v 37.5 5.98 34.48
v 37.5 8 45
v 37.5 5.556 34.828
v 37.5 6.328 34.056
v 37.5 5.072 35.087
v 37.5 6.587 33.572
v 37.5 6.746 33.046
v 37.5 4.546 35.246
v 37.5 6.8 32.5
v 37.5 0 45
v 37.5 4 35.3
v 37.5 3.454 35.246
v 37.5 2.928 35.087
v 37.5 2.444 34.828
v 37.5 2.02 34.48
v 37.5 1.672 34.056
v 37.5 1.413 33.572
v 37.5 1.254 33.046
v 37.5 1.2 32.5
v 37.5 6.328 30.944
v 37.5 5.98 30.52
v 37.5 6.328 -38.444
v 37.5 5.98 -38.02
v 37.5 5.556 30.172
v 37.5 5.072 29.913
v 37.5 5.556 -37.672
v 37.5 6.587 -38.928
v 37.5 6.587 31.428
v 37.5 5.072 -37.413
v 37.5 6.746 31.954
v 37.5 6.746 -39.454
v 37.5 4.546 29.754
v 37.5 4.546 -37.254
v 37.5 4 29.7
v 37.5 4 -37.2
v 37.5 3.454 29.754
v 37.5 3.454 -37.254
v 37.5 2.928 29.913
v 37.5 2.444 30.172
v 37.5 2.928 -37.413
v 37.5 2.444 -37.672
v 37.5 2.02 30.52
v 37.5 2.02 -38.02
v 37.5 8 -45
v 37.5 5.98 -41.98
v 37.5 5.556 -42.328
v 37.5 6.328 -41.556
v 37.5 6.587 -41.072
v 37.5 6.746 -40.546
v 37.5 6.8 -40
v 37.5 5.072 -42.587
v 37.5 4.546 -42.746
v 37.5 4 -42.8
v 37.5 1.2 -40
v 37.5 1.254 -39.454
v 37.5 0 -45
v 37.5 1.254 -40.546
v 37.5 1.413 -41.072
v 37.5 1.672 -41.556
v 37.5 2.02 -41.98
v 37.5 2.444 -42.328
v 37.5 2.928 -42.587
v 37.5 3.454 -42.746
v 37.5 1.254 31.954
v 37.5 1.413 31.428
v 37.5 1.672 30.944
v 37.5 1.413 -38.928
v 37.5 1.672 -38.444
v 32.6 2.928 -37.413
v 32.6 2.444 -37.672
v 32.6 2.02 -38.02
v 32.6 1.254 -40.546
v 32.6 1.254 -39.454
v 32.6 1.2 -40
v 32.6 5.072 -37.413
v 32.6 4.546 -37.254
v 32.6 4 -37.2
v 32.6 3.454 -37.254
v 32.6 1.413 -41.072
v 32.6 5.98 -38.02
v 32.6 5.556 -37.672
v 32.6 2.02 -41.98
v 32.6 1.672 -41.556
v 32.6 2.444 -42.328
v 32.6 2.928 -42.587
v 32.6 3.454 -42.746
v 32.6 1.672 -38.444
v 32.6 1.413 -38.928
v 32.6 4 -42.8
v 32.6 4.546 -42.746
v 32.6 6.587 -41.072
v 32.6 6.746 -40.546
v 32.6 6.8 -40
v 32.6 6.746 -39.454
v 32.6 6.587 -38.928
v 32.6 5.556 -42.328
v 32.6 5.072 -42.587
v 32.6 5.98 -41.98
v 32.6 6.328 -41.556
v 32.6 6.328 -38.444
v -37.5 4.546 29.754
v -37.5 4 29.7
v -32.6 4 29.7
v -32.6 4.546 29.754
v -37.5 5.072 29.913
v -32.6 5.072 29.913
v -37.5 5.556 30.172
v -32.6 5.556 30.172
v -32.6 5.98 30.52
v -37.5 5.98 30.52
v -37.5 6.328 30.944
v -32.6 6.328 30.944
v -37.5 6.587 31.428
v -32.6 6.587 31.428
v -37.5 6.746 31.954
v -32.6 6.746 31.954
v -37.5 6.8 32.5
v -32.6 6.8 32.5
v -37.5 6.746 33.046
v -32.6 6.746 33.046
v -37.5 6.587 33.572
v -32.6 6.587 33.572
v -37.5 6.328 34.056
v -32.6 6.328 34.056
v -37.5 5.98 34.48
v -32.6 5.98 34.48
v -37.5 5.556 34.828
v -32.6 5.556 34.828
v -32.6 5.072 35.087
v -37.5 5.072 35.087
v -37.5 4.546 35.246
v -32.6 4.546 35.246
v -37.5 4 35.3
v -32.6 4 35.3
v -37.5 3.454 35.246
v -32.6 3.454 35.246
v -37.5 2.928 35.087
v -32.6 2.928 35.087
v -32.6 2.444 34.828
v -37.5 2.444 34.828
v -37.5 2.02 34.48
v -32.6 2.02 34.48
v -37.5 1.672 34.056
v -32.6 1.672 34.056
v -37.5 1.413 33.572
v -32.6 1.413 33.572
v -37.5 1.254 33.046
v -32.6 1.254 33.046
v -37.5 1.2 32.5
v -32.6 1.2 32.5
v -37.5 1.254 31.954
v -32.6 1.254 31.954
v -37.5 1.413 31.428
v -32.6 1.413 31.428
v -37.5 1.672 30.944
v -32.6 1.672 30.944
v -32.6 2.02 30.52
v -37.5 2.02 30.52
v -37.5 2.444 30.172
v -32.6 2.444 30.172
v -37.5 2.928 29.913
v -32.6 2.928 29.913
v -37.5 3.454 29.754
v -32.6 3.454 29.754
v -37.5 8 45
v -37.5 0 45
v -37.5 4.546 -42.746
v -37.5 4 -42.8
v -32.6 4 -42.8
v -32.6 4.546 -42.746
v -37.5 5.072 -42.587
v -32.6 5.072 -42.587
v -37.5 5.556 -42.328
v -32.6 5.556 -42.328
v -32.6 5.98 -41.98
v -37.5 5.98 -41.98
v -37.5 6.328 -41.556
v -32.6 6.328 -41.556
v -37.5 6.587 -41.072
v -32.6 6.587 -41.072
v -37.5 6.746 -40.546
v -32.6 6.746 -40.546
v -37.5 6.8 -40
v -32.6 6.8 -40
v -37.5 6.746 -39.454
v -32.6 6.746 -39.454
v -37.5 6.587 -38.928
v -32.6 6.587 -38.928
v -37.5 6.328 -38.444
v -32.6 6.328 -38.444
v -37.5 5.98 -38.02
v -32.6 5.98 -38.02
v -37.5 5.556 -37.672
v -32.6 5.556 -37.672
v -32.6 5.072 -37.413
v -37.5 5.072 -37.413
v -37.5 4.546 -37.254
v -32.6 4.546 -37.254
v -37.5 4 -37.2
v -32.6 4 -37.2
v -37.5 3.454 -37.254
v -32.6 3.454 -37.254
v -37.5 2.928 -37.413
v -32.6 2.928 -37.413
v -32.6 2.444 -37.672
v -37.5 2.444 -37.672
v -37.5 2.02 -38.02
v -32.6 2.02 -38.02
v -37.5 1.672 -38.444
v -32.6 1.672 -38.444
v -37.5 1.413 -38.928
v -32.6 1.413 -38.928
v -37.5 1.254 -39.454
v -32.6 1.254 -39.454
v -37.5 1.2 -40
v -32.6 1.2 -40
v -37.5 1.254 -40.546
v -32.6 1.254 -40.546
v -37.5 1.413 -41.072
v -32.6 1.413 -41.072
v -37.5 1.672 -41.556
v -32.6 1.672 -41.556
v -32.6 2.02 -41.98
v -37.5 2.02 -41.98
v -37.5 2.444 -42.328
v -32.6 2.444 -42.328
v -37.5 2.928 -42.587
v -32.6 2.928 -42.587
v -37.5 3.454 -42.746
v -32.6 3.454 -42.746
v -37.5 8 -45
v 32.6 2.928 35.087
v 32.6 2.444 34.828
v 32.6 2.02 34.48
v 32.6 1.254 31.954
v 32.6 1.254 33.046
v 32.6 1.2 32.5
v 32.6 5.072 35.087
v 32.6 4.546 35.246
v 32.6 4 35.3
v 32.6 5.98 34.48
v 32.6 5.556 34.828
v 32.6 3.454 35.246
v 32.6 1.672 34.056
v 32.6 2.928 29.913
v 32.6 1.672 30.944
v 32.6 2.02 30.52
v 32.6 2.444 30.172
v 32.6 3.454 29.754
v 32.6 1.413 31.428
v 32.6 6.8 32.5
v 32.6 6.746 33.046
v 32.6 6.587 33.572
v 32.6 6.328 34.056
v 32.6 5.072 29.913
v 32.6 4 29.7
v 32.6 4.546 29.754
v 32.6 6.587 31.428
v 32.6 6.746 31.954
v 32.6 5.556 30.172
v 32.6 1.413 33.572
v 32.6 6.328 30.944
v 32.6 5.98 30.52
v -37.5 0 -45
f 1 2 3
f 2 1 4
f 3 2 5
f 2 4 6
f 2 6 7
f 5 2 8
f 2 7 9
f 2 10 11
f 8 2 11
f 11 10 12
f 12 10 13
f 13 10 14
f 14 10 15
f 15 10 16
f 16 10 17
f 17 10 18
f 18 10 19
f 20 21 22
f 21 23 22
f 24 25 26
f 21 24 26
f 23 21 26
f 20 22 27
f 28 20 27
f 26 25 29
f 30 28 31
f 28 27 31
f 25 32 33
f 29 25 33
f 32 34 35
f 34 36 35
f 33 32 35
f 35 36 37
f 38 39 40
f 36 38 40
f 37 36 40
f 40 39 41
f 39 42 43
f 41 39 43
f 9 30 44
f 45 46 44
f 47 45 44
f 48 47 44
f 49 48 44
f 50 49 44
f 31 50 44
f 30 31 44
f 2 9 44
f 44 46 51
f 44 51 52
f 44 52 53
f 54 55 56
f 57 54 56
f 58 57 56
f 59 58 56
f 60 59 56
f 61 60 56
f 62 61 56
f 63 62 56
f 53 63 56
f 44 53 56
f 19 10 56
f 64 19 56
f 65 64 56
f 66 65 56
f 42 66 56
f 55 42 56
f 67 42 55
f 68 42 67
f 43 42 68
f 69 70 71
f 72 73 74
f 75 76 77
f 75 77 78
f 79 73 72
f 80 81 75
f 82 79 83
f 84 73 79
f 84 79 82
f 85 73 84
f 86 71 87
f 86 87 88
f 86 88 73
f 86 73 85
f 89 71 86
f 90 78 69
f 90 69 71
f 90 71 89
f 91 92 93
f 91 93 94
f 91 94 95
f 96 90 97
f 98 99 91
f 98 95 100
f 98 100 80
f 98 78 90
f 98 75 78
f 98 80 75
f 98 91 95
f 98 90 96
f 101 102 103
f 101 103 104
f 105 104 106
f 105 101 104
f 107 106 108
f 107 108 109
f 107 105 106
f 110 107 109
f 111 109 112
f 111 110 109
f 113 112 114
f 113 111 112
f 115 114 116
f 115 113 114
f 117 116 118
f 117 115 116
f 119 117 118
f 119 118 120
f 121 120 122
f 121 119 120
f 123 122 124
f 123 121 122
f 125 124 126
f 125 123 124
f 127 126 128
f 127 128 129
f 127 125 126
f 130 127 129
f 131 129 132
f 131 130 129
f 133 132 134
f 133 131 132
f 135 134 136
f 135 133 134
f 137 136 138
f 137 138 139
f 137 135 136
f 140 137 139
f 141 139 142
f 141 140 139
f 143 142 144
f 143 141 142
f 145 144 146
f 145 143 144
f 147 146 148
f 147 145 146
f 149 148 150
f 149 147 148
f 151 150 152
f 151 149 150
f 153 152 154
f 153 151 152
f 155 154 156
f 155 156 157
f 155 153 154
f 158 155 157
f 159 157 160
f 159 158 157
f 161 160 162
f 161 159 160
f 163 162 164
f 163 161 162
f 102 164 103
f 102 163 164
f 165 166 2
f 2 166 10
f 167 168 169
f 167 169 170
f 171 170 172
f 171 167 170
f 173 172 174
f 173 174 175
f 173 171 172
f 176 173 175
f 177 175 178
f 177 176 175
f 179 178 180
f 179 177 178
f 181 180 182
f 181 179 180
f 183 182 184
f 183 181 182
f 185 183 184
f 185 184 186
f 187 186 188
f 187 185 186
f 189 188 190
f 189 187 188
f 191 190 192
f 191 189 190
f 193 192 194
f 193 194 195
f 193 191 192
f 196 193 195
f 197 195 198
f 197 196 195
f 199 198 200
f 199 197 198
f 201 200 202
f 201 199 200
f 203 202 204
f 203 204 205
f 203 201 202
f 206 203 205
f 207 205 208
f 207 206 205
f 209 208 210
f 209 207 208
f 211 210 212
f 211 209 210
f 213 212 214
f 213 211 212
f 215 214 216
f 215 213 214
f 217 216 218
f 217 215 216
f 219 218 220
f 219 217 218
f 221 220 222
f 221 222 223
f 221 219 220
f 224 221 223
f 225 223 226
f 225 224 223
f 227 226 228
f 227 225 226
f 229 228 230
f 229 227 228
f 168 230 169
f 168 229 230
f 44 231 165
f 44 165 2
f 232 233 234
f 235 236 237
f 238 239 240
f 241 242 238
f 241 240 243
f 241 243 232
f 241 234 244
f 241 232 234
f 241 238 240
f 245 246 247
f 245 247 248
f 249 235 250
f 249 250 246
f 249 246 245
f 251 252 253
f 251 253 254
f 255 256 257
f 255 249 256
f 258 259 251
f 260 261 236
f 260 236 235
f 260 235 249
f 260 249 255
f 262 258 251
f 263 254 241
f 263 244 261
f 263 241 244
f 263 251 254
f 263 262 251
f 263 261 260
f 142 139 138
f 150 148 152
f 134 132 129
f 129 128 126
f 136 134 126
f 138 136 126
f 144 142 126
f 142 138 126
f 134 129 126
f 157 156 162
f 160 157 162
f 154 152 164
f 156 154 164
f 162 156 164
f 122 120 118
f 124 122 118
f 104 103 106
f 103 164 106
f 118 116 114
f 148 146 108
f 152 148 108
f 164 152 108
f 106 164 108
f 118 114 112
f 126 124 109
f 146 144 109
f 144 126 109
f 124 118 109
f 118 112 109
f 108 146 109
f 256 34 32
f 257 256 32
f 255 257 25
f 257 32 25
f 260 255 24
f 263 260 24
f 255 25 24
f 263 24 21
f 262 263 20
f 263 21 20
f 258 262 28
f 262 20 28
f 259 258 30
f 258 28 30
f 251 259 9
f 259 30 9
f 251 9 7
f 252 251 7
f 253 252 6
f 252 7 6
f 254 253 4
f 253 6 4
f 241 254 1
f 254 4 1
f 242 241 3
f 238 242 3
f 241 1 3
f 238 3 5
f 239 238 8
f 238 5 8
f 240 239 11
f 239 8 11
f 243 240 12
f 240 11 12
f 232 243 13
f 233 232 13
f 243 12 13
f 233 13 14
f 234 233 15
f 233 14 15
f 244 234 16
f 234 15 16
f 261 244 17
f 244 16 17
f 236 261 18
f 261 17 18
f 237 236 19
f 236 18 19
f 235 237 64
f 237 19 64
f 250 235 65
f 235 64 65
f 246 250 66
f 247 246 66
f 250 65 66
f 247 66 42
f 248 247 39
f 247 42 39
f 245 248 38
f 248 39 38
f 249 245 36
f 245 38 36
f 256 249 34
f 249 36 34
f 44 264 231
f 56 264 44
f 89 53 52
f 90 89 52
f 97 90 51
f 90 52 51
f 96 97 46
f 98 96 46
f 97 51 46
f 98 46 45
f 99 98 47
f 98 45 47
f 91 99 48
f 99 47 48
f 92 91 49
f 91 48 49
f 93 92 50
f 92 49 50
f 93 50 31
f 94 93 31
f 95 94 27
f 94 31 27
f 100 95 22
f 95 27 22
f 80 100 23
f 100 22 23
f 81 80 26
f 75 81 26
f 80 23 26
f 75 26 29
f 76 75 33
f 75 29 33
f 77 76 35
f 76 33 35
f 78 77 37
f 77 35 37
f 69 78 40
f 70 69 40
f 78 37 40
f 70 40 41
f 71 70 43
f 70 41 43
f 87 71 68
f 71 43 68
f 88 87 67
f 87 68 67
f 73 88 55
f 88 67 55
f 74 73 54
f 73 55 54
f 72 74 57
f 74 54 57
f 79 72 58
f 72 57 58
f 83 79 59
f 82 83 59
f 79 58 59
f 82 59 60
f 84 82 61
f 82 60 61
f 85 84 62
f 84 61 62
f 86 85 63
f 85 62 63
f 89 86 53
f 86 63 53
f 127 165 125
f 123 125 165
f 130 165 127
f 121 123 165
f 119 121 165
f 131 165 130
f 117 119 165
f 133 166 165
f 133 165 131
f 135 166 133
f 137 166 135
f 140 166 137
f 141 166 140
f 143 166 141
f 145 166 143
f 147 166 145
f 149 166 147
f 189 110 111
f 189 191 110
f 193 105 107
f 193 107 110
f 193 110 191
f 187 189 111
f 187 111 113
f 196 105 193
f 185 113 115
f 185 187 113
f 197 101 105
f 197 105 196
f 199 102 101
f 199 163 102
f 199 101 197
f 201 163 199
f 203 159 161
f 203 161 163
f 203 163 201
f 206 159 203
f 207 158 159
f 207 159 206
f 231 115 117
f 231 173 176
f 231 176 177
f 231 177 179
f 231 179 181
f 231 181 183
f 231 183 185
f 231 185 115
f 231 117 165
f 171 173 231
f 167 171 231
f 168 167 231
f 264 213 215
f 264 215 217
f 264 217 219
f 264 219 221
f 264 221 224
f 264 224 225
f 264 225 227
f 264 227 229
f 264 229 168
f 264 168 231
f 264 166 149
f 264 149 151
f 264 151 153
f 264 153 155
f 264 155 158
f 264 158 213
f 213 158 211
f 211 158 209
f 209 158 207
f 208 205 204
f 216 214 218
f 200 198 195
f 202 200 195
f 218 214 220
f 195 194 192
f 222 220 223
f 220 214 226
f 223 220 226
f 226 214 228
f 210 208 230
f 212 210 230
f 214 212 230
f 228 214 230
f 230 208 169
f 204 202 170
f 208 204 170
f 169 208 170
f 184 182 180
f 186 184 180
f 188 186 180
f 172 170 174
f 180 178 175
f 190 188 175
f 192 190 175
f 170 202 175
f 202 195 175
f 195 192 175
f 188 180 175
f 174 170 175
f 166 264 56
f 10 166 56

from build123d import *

# Parameters (mm, degrees)
SKETCH1_W           = 75
SKETCH1_H           = 90
BOSS_EXTRUDE1_DEPTH = 8
SKETCH2_R           = 2.8
CUT_EXTRUDE1_DEPTH  = 4.9


with BuildPart() as part:
    # Sketch1 → Boss-Extrude1 (new body)
    with BuildSketch(Plane(origin=(0, 0, 0), x_dir=(1, 0, 0), z_dir=(0, 1, 0))):
        Rectangle(SKETCH1_W, SKETCH1_H)
    extrude(amount=BOSS_EXTRUDE1_DEPTH)

    # Sketch2 → Cut-Extrude1 (cut)
    with BuildSketch(Plane(origin=(37.5, 0, 0), x_dir=(0, 0, -1), z_dir=(1, 0, 0))):
        with Locations((40, 4)):
            Circle(SKETCH2_R)
        with Locations((-32.5, 4)):
            Circle(SKETCH2_R)
    cut_extrude1 = extrude(amount=-CUT_EXTRUDE1_DEPTH, mode=Mode.SUBTRACT)

    # Mirror1: Cut-Extrude1 across plane
    add(cut_extrude1.mirror(Plane(origin=(0, 0, 0), x_dir=(0, 0, 1), z_dir=(1, 0, 0))), mode=Mode.SUBTRACT)


solid = part.part
